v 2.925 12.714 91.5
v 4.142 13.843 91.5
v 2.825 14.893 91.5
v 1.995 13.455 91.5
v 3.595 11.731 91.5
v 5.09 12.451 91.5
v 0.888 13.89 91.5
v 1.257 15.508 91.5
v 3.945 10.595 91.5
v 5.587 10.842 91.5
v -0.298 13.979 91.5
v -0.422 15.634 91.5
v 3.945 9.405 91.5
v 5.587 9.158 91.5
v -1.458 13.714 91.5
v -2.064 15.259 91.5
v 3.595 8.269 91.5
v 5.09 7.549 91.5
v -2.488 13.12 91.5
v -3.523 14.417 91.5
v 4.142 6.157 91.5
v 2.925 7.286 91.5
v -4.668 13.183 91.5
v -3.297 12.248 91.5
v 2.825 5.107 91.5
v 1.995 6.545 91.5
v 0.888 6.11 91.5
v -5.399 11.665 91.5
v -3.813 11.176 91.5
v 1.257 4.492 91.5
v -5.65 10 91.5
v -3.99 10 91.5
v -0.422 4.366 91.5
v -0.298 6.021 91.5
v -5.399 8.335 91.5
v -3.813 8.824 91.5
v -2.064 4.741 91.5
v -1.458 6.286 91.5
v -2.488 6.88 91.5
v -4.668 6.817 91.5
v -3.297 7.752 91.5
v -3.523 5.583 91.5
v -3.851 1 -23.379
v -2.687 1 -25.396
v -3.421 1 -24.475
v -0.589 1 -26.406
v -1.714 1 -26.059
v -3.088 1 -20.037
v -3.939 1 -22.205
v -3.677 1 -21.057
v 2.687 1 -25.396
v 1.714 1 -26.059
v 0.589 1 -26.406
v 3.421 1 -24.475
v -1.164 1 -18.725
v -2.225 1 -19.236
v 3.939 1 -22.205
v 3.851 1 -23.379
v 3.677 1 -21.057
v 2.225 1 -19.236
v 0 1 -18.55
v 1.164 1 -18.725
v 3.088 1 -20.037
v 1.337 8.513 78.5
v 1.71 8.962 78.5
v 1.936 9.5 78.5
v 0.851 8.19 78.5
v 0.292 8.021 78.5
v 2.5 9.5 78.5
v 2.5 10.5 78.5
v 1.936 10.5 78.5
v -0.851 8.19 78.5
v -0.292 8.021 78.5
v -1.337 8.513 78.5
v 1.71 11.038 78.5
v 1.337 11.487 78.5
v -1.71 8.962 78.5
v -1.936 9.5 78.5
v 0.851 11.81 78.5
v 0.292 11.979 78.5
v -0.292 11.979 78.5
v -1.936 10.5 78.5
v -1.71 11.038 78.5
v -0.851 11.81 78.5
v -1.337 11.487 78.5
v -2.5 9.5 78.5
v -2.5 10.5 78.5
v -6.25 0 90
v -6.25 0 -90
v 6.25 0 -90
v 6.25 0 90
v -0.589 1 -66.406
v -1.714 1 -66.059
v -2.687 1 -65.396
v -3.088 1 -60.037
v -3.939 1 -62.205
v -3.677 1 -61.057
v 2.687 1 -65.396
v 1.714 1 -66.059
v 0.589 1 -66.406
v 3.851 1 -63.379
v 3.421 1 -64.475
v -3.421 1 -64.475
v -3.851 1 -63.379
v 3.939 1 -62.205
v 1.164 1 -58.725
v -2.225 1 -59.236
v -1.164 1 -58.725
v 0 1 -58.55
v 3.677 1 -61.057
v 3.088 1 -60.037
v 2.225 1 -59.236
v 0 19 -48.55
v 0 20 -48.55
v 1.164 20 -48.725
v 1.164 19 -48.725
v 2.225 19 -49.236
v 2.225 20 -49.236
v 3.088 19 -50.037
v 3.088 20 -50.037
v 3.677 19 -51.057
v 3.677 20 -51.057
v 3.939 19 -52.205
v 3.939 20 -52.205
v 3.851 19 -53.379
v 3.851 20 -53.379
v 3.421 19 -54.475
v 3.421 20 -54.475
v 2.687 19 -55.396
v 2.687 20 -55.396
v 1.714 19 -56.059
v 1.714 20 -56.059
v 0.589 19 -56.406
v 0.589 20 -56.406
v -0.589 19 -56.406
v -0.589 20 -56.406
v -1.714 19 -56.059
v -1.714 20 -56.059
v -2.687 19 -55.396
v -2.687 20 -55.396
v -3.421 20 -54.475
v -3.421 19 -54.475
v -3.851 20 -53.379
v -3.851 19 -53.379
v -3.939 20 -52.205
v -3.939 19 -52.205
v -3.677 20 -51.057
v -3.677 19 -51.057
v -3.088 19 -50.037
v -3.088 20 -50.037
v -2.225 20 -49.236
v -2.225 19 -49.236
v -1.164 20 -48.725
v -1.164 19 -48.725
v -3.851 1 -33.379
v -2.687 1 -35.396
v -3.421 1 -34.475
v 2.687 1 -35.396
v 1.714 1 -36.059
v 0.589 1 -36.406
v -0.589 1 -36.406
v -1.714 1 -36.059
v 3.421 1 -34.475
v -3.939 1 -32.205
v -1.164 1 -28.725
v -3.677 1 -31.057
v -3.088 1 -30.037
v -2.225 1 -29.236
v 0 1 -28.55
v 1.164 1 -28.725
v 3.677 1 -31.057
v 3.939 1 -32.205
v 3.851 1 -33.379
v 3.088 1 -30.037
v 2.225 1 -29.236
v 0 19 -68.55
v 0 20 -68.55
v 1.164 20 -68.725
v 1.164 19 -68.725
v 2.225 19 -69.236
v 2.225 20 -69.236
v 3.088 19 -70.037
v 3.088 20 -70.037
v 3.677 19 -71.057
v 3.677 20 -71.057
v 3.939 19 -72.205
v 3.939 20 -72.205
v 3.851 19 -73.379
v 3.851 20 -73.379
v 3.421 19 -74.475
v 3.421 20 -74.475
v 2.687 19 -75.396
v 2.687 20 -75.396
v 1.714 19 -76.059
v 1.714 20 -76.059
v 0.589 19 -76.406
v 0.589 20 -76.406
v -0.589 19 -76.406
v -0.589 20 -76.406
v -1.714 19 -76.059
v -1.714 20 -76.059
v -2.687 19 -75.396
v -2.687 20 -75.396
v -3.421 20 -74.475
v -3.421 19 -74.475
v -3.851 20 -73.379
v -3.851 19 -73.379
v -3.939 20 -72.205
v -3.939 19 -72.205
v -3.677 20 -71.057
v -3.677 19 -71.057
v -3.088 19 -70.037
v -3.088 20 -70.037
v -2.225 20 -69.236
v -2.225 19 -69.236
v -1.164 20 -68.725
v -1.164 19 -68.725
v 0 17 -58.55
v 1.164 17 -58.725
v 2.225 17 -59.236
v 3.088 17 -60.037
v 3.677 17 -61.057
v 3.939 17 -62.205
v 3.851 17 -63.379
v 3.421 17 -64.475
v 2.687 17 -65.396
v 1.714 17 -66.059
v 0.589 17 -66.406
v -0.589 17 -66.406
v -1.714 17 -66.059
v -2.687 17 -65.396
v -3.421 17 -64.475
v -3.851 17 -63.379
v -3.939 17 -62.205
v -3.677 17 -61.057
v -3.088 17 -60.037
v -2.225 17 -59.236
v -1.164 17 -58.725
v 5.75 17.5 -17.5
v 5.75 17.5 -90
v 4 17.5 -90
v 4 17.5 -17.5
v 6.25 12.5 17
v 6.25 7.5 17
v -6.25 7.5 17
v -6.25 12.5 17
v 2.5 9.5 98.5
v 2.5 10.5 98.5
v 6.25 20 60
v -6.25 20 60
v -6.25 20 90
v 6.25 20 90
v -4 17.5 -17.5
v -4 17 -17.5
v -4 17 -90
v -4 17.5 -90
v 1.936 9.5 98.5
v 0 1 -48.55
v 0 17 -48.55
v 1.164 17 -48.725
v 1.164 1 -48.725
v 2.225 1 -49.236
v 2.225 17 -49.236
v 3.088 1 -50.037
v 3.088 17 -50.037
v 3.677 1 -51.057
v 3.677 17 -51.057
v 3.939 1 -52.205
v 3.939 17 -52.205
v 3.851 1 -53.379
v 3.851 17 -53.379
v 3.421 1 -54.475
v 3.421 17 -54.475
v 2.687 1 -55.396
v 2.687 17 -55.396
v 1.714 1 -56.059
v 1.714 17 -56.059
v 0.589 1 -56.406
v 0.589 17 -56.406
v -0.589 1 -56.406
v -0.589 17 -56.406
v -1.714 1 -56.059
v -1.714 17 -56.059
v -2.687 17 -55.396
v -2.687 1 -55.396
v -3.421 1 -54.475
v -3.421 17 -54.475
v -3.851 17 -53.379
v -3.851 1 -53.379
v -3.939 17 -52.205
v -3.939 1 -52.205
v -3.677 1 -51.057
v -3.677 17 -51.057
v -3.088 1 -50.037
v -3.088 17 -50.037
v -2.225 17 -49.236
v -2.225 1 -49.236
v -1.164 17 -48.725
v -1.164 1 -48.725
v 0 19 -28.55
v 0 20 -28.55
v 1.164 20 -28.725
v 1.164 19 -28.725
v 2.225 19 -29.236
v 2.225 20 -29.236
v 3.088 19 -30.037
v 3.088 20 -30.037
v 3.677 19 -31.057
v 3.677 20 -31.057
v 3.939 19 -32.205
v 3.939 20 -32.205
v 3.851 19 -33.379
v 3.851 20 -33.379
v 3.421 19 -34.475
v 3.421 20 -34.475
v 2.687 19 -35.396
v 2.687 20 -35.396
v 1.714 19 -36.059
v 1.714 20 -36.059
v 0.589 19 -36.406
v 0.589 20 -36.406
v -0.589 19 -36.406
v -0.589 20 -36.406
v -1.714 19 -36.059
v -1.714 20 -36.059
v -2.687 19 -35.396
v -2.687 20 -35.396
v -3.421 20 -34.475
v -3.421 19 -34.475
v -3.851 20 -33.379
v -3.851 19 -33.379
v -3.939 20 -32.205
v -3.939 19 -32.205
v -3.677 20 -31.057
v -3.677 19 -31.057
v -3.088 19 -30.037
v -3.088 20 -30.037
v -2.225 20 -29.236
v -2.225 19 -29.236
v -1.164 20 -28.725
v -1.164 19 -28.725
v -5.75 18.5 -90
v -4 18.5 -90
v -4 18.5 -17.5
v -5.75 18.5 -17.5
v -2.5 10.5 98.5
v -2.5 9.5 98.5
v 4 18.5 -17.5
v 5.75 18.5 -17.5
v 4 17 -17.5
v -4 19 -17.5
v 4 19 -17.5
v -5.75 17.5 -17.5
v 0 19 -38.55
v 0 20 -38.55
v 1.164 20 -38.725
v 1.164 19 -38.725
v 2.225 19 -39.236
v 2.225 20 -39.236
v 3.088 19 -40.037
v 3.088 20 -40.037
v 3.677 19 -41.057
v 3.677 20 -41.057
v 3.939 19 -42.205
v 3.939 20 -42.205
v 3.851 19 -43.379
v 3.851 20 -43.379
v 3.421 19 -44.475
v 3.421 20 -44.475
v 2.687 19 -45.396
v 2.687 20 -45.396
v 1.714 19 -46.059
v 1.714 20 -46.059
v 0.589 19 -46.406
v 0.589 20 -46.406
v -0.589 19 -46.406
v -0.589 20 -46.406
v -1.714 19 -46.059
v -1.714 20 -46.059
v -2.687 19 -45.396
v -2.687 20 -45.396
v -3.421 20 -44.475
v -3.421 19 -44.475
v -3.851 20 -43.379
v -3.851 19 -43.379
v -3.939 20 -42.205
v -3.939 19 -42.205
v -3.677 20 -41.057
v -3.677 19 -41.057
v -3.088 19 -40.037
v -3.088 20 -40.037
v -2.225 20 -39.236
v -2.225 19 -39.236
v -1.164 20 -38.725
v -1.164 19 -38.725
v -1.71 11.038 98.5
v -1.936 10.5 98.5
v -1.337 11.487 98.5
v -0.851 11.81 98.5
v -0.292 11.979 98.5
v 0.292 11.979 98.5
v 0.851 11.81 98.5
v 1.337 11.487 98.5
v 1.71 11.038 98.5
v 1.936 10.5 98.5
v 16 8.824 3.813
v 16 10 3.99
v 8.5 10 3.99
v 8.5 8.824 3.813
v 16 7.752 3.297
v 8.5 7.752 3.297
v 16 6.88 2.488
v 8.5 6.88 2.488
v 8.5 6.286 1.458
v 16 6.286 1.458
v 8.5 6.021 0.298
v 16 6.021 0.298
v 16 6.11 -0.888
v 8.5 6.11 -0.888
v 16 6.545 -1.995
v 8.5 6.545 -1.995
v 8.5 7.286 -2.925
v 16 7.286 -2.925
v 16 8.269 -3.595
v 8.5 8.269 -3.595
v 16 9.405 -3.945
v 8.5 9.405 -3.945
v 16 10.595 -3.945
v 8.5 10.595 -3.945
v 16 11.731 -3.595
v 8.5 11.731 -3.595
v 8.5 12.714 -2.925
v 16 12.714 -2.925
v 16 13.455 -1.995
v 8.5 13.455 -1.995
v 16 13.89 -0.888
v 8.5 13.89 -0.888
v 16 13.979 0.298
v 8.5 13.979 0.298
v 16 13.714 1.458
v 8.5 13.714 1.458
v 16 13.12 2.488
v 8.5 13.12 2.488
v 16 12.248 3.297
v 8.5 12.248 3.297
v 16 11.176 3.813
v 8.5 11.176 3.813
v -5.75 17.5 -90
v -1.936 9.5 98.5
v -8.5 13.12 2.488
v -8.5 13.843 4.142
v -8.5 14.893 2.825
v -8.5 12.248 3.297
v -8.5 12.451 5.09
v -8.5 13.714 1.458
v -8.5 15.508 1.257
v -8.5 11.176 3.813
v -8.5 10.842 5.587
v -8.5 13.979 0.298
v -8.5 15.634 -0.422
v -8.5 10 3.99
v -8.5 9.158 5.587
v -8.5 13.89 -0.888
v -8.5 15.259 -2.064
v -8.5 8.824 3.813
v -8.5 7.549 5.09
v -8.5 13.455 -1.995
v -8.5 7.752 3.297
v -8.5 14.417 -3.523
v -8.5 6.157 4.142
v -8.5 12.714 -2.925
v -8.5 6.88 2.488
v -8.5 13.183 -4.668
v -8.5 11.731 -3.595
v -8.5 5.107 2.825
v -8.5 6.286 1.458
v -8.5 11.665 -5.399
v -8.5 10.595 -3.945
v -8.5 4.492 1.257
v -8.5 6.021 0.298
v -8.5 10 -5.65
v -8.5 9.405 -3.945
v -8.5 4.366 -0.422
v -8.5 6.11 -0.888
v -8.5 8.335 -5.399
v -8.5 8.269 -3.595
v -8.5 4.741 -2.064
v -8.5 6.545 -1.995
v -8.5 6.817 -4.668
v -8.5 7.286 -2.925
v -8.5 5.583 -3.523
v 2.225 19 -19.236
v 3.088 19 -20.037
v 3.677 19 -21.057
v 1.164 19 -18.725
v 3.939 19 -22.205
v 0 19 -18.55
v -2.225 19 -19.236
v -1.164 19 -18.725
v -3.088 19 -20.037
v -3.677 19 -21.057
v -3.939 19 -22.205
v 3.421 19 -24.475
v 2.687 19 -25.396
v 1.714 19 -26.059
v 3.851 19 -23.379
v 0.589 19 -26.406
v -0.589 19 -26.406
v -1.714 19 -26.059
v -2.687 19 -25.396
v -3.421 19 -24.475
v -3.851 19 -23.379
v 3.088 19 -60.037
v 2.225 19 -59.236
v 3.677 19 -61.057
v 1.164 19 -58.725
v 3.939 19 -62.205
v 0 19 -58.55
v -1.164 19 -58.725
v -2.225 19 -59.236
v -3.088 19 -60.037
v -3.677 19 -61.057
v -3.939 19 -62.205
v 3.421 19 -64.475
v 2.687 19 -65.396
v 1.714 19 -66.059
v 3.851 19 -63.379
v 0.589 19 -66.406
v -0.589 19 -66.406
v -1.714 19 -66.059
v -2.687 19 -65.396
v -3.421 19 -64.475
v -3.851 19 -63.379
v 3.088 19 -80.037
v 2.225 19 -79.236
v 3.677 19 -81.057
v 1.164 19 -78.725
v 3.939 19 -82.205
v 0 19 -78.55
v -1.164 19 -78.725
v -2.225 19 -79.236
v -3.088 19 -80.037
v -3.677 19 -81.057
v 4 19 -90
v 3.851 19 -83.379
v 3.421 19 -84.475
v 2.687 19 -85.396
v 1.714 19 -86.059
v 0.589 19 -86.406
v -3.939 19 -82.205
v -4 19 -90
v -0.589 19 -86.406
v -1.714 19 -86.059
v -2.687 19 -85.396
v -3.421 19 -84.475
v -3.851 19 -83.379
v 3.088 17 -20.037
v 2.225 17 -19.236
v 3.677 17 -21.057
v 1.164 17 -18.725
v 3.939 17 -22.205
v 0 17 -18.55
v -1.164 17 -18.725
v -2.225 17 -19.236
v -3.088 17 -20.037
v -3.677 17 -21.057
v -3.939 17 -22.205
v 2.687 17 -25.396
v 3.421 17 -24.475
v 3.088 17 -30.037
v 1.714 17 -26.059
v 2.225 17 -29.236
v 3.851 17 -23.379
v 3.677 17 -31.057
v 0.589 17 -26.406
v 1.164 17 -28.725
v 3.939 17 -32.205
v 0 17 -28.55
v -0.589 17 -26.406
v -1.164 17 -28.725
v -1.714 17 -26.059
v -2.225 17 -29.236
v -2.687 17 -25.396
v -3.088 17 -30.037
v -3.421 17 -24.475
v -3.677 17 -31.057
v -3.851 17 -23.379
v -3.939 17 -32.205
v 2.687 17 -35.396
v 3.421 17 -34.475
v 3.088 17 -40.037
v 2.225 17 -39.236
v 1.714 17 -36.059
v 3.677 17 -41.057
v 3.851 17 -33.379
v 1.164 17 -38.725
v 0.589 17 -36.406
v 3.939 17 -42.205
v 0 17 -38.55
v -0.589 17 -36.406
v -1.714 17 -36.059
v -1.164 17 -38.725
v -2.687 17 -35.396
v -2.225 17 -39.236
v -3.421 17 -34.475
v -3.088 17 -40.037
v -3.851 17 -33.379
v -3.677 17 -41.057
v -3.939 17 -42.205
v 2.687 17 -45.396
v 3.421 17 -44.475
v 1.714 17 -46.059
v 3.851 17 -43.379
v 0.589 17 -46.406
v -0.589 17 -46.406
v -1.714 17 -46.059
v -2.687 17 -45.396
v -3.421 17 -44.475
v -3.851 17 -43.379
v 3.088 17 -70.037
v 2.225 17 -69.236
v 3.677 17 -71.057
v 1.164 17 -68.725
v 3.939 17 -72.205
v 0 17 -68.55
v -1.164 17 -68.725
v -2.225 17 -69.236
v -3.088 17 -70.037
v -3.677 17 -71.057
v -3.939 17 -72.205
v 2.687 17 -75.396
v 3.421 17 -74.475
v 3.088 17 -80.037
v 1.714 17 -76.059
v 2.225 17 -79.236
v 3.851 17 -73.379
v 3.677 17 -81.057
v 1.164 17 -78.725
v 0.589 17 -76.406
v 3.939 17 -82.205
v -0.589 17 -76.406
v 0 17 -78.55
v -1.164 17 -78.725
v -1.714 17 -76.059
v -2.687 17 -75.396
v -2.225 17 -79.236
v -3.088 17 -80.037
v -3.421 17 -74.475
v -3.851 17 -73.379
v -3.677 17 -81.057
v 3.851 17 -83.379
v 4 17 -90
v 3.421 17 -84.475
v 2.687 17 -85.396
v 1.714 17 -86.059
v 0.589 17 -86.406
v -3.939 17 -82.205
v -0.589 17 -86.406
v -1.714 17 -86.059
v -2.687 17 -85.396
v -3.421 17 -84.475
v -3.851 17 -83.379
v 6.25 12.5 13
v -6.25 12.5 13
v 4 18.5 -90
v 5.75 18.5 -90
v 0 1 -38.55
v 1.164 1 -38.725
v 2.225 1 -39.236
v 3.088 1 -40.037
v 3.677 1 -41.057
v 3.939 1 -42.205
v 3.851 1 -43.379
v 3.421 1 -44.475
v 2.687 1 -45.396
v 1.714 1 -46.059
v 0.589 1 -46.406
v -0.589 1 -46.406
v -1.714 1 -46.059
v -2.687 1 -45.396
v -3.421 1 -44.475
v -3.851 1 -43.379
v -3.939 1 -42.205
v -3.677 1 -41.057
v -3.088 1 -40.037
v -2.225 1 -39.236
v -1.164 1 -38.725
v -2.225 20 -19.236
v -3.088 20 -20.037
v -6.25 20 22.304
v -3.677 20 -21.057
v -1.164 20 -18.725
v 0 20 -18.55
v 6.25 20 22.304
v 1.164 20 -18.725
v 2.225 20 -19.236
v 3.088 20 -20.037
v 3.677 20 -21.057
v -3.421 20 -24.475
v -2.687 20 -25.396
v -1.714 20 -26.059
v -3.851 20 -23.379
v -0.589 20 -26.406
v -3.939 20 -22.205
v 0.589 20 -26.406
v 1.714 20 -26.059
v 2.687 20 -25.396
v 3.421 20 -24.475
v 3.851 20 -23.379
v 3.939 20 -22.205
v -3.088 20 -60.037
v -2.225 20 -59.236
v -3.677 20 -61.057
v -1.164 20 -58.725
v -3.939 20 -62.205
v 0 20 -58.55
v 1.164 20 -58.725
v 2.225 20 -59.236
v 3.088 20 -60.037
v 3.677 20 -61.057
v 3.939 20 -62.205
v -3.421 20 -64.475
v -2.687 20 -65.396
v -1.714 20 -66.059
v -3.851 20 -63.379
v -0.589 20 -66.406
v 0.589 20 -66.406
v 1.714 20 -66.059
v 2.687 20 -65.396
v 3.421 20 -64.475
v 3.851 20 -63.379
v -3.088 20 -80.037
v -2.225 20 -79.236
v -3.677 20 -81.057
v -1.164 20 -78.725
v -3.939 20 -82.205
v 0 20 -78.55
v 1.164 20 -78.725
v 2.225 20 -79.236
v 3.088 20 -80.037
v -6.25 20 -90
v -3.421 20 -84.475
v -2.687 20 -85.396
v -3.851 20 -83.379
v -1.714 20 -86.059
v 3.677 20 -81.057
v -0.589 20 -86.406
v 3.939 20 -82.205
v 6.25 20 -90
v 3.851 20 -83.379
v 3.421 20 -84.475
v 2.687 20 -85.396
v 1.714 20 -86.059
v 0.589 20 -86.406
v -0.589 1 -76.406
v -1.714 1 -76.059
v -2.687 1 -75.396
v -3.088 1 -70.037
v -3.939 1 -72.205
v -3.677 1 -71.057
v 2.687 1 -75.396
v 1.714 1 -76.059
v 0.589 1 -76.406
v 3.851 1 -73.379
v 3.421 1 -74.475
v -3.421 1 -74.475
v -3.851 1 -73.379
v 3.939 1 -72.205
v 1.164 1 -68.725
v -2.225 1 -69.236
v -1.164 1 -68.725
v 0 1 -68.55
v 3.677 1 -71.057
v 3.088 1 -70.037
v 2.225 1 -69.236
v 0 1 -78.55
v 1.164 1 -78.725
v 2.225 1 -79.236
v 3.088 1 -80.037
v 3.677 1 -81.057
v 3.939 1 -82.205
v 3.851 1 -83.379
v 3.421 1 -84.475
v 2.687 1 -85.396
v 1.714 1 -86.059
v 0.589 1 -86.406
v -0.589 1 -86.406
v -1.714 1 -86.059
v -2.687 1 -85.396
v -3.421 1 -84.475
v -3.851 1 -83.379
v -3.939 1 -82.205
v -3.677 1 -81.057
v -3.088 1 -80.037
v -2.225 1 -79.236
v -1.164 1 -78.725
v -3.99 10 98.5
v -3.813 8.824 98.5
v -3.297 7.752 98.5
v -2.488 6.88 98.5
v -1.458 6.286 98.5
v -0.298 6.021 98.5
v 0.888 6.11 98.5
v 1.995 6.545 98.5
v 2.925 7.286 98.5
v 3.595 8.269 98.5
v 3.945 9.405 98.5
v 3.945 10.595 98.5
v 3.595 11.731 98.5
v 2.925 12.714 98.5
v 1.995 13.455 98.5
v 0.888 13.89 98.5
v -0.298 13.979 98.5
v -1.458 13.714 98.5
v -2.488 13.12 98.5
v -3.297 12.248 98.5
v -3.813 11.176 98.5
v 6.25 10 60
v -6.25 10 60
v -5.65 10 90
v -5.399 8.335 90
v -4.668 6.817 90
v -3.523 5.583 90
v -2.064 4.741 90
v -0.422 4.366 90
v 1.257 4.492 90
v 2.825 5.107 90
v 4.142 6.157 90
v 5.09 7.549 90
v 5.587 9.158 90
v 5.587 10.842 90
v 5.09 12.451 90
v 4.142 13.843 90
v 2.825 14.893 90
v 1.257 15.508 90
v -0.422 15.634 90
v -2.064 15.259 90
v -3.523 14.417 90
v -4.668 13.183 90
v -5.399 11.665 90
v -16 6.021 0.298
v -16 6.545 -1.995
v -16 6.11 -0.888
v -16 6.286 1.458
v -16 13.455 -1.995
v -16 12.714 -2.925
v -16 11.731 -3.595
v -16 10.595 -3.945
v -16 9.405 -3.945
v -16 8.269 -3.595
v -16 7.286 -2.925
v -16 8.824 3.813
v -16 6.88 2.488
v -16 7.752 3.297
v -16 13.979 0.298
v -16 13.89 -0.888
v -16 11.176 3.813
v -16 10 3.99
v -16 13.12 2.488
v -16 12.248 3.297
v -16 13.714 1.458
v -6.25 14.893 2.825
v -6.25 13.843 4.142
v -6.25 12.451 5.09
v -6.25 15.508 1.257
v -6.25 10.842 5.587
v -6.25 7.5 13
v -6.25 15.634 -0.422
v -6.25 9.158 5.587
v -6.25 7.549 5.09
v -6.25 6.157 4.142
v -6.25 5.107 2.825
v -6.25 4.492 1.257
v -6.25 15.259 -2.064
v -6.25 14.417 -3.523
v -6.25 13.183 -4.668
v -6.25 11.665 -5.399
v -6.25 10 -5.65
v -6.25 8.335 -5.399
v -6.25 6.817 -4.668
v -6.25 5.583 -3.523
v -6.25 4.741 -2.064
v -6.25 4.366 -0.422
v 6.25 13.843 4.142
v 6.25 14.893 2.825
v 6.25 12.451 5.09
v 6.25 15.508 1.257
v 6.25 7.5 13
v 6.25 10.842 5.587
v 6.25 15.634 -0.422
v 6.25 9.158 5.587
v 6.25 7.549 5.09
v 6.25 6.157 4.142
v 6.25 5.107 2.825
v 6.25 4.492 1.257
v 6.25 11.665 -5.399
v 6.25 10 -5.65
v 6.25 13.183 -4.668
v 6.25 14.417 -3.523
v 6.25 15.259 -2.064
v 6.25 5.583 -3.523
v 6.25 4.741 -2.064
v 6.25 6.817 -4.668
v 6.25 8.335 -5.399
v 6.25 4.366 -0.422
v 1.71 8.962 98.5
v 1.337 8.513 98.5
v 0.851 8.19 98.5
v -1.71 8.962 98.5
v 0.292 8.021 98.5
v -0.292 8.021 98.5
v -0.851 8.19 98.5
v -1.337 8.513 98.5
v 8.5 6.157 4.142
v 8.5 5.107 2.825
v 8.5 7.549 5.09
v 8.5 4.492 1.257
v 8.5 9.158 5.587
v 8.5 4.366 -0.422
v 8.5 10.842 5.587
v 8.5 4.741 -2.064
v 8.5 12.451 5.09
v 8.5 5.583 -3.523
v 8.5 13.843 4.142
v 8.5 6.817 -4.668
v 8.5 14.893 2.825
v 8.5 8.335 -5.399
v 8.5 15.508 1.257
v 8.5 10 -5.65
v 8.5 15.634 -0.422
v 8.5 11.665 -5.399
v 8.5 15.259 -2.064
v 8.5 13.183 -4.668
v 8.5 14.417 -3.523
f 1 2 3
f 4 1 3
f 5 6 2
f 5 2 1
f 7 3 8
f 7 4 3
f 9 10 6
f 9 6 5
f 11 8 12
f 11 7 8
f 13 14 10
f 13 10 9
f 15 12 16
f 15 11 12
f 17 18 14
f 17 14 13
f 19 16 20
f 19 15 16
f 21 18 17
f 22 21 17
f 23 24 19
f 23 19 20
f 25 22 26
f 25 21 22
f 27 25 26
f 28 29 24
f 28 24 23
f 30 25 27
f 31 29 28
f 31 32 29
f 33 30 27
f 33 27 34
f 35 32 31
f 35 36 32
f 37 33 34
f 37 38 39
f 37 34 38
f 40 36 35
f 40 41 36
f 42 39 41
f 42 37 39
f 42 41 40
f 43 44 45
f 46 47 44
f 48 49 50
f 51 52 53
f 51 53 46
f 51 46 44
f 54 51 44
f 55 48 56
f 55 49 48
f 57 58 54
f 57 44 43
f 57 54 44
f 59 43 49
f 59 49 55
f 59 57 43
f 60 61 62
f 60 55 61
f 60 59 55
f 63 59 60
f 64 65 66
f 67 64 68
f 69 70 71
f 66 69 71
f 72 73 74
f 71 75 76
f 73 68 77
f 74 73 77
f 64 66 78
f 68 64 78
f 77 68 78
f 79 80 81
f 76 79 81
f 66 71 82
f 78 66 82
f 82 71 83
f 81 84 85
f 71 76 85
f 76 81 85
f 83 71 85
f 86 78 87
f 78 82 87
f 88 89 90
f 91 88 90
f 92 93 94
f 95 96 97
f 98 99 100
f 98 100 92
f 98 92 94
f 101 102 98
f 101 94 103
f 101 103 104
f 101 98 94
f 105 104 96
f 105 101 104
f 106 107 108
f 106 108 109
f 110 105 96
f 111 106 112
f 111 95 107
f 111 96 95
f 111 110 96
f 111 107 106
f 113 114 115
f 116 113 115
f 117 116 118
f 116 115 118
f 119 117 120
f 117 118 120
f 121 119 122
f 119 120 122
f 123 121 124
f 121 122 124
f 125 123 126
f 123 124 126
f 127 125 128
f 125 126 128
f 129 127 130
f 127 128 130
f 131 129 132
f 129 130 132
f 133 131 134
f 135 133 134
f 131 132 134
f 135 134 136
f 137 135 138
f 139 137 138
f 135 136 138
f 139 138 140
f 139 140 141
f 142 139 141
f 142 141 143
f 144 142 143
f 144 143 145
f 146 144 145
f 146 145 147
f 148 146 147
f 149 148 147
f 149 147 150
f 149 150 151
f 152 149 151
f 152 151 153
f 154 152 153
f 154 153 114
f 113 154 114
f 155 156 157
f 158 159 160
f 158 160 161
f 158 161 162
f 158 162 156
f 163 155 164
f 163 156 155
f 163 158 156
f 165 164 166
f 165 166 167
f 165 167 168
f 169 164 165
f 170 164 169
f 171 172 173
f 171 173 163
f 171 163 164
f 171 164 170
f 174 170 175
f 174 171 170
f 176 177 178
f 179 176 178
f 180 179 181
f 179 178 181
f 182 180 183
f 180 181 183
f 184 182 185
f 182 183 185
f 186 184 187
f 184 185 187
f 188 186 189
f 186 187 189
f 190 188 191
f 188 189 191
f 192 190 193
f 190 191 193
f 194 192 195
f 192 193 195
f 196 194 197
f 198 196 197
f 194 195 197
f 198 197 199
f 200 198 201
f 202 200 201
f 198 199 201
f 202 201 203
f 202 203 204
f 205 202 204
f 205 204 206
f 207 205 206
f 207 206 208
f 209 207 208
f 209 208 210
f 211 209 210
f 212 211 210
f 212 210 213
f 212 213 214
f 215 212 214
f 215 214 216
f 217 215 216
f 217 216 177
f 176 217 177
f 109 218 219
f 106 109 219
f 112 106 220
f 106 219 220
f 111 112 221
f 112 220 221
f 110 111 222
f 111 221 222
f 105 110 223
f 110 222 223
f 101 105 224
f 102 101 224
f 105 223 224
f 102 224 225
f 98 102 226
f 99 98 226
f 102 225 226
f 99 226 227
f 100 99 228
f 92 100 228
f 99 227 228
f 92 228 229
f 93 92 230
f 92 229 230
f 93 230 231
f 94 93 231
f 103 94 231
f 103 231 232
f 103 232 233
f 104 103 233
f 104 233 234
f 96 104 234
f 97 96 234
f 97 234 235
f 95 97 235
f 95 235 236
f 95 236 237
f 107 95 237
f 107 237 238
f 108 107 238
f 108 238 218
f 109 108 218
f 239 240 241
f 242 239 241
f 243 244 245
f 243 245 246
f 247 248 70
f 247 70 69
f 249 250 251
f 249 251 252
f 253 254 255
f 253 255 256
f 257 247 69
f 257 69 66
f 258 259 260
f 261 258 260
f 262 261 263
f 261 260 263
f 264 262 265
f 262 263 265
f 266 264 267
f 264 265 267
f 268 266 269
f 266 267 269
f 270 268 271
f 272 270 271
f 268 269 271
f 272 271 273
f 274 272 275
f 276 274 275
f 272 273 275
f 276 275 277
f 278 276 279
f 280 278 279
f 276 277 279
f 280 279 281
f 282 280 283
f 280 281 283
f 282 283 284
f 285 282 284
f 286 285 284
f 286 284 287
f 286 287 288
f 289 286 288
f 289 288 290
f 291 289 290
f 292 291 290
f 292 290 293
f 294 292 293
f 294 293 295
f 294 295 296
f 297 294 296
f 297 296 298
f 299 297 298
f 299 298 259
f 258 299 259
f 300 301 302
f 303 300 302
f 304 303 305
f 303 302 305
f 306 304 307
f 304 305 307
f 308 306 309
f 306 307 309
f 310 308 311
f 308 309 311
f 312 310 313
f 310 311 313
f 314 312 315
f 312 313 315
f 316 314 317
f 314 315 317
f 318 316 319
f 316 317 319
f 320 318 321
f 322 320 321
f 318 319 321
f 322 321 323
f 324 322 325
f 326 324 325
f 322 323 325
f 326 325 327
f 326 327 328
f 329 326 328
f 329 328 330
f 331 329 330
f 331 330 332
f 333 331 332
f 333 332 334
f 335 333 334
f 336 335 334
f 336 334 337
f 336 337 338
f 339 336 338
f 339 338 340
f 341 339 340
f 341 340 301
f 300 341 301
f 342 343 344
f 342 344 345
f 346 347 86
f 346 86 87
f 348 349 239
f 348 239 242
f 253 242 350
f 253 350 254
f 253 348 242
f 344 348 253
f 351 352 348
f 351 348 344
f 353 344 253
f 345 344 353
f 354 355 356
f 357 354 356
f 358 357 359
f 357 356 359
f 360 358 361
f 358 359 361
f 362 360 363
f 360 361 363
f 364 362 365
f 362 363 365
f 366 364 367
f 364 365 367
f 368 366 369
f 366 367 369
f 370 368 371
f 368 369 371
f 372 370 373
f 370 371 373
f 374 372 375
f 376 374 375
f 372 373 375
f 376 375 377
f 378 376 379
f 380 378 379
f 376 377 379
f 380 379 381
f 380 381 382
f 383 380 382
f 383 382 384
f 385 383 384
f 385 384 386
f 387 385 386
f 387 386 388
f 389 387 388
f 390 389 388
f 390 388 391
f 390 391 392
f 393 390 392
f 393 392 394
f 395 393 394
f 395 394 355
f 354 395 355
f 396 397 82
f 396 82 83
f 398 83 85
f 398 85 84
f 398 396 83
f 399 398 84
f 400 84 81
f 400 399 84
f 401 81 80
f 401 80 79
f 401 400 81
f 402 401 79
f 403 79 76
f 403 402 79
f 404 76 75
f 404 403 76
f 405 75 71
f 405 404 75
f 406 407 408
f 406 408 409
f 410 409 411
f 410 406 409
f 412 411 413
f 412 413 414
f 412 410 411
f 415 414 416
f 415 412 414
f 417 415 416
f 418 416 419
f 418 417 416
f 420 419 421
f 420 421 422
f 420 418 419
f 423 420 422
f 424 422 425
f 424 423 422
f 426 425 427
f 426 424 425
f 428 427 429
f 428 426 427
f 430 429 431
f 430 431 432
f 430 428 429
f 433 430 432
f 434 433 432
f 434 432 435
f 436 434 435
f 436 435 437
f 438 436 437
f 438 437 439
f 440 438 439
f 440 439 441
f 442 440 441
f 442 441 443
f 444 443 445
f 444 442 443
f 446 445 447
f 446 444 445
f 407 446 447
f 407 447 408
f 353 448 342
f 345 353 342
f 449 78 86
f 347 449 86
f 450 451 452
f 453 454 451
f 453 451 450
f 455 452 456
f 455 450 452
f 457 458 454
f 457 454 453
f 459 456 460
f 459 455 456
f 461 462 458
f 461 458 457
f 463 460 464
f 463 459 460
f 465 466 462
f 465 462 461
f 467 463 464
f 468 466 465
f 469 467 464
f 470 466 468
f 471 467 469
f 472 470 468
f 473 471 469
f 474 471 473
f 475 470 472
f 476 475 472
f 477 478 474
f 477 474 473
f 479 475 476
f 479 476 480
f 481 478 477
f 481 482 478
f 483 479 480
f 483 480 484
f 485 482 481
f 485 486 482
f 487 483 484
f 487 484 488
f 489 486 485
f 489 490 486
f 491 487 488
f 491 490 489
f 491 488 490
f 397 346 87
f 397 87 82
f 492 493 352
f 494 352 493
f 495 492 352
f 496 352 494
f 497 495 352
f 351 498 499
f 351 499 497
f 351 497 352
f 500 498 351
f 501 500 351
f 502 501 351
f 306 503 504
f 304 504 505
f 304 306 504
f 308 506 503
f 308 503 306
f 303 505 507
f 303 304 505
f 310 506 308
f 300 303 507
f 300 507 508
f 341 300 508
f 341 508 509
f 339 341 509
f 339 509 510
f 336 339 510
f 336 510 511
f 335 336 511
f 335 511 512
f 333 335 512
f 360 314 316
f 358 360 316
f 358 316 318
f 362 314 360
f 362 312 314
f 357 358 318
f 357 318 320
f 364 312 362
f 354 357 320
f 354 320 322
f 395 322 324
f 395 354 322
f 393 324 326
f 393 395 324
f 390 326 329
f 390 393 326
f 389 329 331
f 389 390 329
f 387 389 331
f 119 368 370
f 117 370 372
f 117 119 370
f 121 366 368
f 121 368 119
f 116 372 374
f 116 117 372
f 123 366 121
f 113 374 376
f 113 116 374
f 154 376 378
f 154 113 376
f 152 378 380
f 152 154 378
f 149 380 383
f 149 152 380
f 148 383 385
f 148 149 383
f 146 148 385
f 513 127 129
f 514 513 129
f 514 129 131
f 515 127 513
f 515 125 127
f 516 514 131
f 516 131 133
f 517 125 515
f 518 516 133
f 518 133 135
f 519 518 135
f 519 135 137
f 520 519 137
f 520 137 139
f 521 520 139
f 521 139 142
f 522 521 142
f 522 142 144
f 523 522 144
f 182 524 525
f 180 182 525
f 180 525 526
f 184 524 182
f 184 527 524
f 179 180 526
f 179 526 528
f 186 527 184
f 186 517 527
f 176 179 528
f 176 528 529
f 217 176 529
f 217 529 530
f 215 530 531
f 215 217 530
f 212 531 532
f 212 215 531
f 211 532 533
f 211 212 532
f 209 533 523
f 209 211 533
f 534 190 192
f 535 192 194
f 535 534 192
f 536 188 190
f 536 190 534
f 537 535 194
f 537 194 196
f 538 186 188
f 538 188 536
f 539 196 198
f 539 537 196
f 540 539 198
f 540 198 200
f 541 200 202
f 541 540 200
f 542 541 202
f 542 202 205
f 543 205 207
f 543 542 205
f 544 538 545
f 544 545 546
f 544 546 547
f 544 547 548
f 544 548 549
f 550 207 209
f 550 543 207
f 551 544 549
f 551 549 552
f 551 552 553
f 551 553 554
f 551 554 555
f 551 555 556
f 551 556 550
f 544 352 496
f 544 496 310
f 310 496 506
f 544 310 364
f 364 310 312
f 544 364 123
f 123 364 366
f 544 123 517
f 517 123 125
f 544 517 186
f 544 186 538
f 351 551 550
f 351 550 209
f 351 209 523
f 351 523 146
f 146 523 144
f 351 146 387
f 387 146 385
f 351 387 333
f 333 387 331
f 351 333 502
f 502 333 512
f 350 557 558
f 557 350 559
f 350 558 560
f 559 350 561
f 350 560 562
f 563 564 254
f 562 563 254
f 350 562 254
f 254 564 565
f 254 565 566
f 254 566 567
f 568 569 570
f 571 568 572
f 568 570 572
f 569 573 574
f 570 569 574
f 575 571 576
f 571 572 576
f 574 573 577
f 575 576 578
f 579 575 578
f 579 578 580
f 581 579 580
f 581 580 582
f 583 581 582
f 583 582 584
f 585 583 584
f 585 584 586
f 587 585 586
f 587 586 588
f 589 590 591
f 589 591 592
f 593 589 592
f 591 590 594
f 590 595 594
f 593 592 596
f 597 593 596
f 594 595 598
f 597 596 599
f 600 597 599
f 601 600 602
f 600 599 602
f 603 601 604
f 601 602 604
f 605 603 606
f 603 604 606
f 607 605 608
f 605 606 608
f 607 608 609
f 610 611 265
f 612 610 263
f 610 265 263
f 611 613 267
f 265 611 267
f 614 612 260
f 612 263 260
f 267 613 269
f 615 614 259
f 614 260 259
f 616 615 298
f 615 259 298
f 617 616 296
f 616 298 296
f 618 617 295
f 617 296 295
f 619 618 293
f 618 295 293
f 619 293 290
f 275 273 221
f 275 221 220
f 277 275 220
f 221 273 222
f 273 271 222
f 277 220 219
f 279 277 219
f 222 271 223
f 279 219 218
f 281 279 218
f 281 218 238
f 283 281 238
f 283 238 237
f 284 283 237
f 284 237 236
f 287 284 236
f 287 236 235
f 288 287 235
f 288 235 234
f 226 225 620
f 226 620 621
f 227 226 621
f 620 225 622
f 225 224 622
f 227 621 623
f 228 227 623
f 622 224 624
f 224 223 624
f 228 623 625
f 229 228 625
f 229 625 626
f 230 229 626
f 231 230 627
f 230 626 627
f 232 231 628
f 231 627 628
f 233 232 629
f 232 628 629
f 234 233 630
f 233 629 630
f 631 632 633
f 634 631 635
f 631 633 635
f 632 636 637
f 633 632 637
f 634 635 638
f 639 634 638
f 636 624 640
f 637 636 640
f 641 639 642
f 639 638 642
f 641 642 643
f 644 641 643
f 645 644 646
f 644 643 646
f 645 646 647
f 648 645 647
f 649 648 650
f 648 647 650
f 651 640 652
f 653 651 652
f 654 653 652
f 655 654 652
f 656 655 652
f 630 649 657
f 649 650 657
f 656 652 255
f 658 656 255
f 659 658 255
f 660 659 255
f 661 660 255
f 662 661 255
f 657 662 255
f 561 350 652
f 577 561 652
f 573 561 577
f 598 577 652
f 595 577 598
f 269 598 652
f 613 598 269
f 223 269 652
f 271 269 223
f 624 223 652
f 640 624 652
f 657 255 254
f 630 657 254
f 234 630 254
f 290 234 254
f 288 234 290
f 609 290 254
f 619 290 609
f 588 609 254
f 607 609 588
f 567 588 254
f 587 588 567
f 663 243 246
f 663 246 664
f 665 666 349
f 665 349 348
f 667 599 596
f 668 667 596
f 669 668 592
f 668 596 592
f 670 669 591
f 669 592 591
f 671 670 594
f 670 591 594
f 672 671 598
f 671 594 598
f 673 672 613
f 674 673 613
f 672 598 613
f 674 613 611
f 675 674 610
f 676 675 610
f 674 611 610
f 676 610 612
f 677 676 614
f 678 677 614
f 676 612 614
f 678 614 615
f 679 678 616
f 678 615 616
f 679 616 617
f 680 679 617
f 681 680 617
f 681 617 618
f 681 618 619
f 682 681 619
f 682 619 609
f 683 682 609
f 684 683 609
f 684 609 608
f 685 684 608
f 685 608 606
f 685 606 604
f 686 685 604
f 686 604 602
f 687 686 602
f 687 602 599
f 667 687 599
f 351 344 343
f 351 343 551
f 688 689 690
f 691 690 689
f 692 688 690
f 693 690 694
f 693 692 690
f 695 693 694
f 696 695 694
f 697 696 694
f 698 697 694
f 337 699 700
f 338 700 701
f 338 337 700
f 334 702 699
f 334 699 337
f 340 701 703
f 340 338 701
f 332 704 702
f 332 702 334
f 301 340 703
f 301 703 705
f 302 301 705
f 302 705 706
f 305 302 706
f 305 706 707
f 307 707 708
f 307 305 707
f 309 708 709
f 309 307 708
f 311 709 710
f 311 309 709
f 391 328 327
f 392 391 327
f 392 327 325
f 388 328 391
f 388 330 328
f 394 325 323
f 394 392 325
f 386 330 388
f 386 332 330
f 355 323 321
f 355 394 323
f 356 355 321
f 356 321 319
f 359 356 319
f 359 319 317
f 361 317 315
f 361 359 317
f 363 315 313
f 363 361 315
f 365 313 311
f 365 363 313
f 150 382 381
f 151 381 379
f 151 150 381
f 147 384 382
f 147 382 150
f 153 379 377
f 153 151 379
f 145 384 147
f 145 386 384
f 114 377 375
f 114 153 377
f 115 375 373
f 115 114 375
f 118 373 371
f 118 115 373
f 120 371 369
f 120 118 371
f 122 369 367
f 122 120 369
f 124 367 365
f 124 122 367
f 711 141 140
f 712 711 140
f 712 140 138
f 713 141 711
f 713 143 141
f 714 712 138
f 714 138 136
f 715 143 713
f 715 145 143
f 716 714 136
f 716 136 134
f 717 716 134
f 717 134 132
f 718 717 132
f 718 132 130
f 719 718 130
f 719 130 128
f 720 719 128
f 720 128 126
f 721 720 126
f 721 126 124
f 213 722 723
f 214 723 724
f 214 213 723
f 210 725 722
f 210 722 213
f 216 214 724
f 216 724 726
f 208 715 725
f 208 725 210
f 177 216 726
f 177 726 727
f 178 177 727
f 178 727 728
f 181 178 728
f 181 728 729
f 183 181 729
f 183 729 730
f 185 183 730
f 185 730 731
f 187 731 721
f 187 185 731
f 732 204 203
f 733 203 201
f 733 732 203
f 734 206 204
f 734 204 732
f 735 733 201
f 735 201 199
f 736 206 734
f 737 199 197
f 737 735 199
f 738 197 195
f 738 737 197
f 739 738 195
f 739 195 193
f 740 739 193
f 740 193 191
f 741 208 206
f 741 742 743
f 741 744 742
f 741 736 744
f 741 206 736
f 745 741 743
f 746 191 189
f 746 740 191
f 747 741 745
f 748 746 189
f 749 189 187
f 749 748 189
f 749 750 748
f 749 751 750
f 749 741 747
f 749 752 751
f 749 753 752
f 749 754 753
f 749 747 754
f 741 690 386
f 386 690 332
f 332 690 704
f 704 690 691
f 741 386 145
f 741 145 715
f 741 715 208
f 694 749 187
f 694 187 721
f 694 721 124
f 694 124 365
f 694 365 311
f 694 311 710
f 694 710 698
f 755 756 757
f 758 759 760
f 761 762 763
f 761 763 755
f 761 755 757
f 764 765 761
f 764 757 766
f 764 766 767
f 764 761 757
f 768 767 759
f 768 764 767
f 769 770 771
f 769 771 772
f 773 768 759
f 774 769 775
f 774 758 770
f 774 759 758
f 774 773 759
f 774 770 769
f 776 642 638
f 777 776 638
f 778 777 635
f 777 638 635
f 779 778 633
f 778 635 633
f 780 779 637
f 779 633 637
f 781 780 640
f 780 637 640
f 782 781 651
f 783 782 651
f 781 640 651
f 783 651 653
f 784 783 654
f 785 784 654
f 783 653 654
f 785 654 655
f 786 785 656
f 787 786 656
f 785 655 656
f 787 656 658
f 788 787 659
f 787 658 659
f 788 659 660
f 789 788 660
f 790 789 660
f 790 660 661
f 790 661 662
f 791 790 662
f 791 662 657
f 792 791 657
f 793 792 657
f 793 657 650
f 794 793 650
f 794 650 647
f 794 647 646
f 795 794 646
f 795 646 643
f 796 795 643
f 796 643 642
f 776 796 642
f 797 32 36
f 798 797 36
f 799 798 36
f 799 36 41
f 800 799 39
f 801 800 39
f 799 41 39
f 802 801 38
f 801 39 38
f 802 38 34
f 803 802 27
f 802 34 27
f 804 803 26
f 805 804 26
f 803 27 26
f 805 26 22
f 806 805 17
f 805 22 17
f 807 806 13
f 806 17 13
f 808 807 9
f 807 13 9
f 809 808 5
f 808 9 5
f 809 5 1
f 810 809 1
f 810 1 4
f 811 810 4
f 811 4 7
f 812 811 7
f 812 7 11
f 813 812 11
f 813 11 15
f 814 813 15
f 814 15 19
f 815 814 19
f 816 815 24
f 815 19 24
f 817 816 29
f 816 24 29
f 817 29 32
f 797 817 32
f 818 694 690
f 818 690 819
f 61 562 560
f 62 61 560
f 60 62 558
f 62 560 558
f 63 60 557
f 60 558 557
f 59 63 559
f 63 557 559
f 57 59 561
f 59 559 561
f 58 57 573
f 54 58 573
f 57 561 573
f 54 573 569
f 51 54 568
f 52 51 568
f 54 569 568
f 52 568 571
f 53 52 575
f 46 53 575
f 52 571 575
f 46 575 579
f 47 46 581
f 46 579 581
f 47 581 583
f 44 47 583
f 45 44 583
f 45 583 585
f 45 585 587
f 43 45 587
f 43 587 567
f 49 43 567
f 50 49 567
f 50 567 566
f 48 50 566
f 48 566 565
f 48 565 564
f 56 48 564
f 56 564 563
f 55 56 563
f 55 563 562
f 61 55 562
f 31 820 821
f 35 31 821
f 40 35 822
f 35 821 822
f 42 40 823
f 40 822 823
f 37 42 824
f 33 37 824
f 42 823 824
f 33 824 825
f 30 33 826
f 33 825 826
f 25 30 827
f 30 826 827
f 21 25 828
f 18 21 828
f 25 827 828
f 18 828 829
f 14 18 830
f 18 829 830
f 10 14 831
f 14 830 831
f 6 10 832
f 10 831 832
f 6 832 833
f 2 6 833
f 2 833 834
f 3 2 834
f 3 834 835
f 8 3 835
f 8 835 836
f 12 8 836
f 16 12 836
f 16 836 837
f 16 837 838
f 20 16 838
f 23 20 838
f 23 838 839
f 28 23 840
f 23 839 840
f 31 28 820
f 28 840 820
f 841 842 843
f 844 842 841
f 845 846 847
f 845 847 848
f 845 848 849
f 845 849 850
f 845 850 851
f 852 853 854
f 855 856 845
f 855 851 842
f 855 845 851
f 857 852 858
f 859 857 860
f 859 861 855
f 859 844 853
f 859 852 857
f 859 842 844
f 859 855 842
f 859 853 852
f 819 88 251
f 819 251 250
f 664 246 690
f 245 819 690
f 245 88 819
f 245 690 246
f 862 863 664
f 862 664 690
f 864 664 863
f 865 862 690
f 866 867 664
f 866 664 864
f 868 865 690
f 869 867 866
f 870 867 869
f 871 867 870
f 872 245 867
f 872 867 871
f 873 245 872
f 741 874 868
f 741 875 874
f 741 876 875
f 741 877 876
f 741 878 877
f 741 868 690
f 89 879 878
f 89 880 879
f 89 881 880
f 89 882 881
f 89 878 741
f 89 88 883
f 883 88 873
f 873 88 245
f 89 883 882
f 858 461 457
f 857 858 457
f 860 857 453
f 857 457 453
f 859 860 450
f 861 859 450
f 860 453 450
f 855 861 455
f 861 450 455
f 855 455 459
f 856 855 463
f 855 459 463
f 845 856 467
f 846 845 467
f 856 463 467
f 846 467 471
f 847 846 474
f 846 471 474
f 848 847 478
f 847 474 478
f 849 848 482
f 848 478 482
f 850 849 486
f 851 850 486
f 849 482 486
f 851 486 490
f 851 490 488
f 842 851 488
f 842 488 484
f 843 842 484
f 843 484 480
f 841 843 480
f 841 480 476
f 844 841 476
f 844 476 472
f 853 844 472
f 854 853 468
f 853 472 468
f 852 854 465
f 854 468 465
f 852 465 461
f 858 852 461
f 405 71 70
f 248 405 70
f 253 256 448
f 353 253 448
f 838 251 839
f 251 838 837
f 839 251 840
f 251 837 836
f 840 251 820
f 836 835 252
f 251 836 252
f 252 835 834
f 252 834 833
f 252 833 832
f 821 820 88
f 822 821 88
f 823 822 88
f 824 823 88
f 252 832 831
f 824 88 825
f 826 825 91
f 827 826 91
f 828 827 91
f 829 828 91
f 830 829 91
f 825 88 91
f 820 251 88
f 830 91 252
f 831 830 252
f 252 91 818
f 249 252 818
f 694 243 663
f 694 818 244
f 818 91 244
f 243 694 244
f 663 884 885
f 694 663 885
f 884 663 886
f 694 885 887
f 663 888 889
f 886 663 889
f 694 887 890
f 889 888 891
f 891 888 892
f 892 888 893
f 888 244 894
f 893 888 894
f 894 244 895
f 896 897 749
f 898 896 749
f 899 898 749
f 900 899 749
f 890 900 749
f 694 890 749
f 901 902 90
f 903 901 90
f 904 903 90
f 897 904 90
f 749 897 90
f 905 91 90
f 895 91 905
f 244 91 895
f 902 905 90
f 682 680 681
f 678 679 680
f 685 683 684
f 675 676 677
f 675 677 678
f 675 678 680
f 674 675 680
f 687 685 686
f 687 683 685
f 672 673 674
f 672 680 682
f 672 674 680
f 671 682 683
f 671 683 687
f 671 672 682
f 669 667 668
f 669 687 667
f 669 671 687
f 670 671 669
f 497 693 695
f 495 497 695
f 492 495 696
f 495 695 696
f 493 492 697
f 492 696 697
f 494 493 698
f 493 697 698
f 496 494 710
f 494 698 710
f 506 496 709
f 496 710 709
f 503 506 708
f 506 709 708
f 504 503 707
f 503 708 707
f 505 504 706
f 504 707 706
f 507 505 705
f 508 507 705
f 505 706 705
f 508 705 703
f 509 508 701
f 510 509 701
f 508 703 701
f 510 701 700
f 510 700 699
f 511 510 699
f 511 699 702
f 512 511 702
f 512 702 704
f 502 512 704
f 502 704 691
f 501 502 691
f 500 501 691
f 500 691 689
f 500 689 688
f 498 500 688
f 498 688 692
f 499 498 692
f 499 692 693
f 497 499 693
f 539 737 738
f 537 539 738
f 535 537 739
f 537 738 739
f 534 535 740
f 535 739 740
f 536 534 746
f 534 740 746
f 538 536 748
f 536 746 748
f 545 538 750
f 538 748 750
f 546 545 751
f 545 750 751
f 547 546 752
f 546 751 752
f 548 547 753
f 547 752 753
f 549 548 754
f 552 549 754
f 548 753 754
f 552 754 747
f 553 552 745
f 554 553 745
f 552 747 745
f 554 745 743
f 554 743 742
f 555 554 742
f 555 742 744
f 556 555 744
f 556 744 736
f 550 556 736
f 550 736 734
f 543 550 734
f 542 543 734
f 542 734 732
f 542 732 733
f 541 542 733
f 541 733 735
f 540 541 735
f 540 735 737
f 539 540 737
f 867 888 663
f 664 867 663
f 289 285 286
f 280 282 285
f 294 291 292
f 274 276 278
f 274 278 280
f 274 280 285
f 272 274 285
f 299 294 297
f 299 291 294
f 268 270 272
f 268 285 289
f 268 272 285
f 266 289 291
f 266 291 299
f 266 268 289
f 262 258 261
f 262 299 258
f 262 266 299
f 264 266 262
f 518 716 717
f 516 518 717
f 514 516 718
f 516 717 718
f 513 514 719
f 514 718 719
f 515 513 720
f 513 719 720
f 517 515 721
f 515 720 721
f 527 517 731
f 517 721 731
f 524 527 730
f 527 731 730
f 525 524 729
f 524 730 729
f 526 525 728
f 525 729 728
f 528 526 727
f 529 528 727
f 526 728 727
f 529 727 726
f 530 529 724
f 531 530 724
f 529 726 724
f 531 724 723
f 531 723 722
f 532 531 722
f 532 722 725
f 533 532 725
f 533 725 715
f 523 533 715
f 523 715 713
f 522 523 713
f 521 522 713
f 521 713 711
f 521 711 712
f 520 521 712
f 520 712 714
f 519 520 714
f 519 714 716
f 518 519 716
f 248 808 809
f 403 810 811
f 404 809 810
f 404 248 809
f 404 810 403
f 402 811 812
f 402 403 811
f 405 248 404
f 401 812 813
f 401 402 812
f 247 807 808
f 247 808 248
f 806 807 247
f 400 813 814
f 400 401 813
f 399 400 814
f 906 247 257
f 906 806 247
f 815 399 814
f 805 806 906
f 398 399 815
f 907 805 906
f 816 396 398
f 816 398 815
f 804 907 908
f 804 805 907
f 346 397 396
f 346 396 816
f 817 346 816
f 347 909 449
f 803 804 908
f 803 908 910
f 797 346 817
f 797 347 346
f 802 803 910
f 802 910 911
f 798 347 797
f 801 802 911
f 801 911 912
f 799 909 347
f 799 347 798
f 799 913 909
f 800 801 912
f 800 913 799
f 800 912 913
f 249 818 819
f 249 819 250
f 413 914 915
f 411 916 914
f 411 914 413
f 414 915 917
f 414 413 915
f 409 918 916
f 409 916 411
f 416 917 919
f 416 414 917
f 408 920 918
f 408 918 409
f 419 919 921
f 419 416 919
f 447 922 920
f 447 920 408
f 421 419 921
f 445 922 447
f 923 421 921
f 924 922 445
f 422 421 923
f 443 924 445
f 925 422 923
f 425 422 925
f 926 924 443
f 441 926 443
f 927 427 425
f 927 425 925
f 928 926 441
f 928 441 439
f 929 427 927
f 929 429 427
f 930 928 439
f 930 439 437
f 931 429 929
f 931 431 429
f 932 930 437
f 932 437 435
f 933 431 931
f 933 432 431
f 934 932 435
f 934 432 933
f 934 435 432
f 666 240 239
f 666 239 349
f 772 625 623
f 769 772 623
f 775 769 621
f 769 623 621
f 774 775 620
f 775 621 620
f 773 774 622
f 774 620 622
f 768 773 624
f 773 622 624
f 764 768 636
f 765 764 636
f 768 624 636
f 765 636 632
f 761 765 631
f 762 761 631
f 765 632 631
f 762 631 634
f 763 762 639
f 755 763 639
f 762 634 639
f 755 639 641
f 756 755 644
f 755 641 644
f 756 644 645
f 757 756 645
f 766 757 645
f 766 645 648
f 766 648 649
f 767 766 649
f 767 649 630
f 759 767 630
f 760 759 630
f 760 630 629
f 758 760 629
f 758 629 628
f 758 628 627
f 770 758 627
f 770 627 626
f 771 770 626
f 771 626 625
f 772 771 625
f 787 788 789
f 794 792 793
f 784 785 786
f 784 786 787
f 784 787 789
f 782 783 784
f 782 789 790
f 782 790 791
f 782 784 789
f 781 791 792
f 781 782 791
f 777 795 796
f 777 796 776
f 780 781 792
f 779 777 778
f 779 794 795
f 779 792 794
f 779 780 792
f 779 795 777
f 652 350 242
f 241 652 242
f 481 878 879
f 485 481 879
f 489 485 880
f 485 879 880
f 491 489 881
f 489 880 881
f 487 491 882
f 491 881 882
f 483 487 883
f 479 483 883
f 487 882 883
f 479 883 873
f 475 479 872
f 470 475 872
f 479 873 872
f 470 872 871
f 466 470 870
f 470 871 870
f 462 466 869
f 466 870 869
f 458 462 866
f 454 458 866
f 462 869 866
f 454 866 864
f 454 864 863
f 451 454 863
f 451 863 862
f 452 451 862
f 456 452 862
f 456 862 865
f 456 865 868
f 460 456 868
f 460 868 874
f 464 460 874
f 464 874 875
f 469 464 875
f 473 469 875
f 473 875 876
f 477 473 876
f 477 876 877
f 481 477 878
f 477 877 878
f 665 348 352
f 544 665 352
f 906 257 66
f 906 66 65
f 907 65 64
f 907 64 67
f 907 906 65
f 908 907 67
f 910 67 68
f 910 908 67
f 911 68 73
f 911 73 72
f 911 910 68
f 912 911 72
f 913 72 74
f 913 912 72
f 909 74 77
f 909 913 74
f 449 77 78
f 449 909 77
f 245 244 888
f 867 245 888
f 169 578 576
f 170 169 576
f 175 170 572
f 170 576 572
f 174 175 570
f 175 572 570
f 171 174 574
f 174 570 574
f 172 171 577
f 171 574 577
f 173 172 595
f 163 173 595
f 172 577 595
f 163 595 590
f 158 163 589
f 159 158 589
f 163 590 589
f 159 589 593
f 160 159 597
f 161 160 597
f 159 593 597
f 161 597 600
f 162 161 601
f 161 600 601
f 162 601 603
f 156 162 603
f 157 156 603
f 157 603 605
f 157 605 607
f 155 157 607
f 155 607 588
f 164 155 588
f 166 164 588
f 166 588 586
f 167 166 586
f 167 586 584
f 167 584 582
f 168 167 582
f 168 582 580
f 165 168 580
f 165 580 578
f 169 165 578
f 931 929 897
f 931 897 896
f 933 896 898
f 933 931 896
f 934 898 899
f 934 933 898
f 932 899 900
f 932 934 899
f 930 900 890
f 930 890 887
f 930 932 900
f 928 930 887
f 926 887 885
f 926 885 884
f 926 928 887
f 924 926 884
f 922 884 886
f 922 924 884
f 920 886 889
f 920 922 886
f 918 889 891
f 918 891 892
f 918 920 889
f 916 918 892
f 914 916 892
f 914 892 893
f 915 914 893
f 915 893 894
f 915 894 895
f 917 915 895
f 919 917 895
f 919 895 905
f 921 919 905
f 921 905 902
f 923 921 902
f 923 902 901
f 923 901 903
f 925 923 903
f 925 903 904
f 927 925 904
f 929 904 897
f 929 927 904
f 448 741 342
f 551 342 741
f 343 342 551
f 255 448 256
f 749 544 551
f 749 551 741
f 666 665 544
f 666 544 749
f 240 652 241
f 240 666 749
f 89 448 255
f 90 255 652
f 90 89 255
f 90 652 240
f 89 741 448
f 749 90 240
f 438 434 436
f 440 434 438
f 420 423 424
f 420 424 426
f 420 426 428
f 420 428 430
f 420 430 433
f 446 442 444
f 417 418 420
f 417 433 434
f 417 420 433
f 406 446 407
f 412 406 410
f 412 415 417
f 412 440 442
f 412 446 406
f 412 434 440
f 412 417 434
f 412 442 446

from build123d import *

# Parameters (mm, degrees)
SKETCH1_W           = 12.5
SKETCH1_H           = 180
BOSS_EXTRUDE1_DEPTH = 20
SKETCH2_R           = 5.65
BOSS_EXTRUDE2_DEPTH = 1.5
SKETCH3_R           = 3.99
BOSS_EXTRUDE3_DEPTH = 7
SKETCH4_R           = 5.65
BOSS_EXTRUDE4_DEPTH = 2.25
SKETCH5_R           = 3.99
BOSS_EXTRUDE5_DEPTH = 7.5
BOSS_EXTRUDE6_START = 2.25
SKETCH6_R           = 5.65
BOSS_EXTRUDE6_DEPTH = 2.25
BOSS_EXTRUDE7_START = 7.5
SKETCH7_R           = 3.99
BOSS_EXTRUDE7_DEPTH = 7.5
SKETCH8_R           = 3.95
CUT_EXTRUDE1_DEPTH  = 19
SKETCH9_W           = 8
SKETCH9_H           = 2
CUT_EXTRUDE2_DEPTH  = 72.5
SKETCH10_W          = 11.5
SKETCH10_H          = 1
CUT_EXTRUDE3_DEPTH  = 72.5
CUT_EXTRUDE5_DEPTH  = 20
SKETCH14_W          = 4
SKETCH14_H          = 5
CUT_EXTRUDE6_DEPTH  = 12.5
CUT_EXTRUDE7_REACH  = 104.943


with BuildPart() as part:
    # Sketch1 → Boss-Extrude1 (new body)
    with BuildSketch(Plane(origin=(0, 0, 0), x_dir=(1, 0, 0), z_dir=(0, 1, 0))):
        Rectangle(SKETCH1_W, SKETCH1_H)
    extrude(amount=BOSS_EXTRUDE1_DEPTH)

    # Sketch2 → Boss-Extrude2 (add)
    with BuildSketch(Plane.XY.offset(90)):
        with Locations(Location((0, 10, 0), (0, 0, 180))):
            Circle(SKETCH2_R)
    extrude(amount=BOSS_EXTRUDE2_DEPTH)

    # Sketch3 → Boss-Extrude3 (add)
    with BuildSketch(Plane.XY.offset(91.5)):
        with Locations(Location((0, 10, 0), (0, 0, 180))):
            Circle(SKETCH3_R)
    extrude(amount=BOSS_EXTRUDE3_DEPTH)

    # Sketch4 → Boss-Extrude4 (add)
    with BuildSketch(Plane.ZY.offset(6.25)):
        with Locations(Location((0, 10, 0), (0, 0, 180))):
            Circle(SKETCH4_R)
    extrude(amount=BOSS_EXTRUDE4_DEPTH)

    # Sketch5 → Boss-Extrude5 (add)
    with BuildSketch(Plane.ZY.offset(8.5)):
        with Locations((0, 10)):
            Circle(SKETCH5_R)
    extrude(amount=BOSS_EXTRUDE5_DEPTH)

    # Sketch6 → Boss-Extrude6 (add)
    with BuildSketch(Plane(origin=(6.25, 0, 0), x_dir=(0, 0, -1), z_dir=(1, 0, 0)).offset(BOSS_EXTRUDE6_START)):
        with Locations((0, 10)):
            Circle(SKETCH6_R)
    extrude(amount=-BOSS_EXTRUDE6_DEPTH)

    # Sketch7 → Boss-Extrude7 (add)
    with BuildSketch(Plane(origin=(8.5, 0, 0), x_dir=(0, 0, -1), z_dir=(1, 0, 0)).offset(BOSS_EXTRUDE7_START)):
        with Locations(Location((0, 10, 0), (0, 0, 180))):
            Circle(SKETCH7_R)
    extrude(amount=-BOSS_EXTRUDE7_DEPTH)

    # Sketch8 → Cut-Extrude1 (cut)
    with BuildSketch(Plane(origin=(0, 20, 0), x_dir=(1, 0, 0), z_dir=(0, 1, 0))):
        with Locations(Location((0, 82.5, 0), (0, 0, 270))):
            Circle(SKETCH8_R)
        with Locations(Location((0, 72.5, 0), (0, 0, 270))):
            Circle(SKETCH8_R)
        with Locations(Location((0, 62.5, 0), (0, 0, 270))):
            Circle(SKETCH8_R)
        with Locations(Location((0, 52.5, 0), (0, 0, 270))):
            Circle(SKETCH8_R)
        with Locations(Location((0, 42.5, 0), (0, 0, 270))):
            Circle(SKETCH8_R)
        with Locations(Location((0, 32.5, 0), (0, 0, 270))):
            Circle(SKETCH8_R)
        with Locations(Location((0, 22.5, 0), (0, 0, 270))):
            Circle(SKETCH8_R)
    extrude(amount=-CUT_EXTRUDE1_DEPTH, mode=Mode.SUBTRACT)

    # Sketch9 → Cut-Extrude2 (cut)
    with BuildSketch(Plane(origin=(0, 0, -90), x_dir=(-1, 0, 0), z_dir=(0, 0, -1))):
        with Locations((0, 18)):
            Rectangle(SKETCH9_W, SKETCH9_H)
    extrude(amount=-CUT_EXTRUDE2_DEPTH, mode=Mode.SUBTRACT)

    # Sketch10 → Cut-Extrude3 (cut)
    with BuildSketch(Plane(origin=(0, 0, -90), x_dir=(-1, 0, 0), z_dir=(0, 0, -1))):
        with Locations((0, 18)):
            Rectangle(SKETCH10_W, SKETCH10_H)
    extrude(amount=-CUT_EXTRUDE3_DEPTH, mode=Mode.SUBTRACT)

    # Sketch12 → Cut-Extrude5 (cut)
    with BuildSketch(Plane.XY.offset(98.5)):
        with BuildLine():
            Line((1.936491673, 10.5), (2.5, 10.5))
            Line((2.5, 10.5), (2.5, 9.5))
            Line((2.5, 9.5), (1.936491673, 9.5))
            ThreePointArc((1.936491673, 9.5), (0, 8), (-1.936491673, 9.5))
            Line((-1.936491673, 9.5), (-2.5, 9.5))
            Line((-2.5, 9.5), (-2.5, 10.5))
            Line((-2.5, 10.5), (-1.936491673, 10.5))
            ThreePointArc((-1.936491673, 10.5), (0, 12), (1.936491673, 10.5))
        make_face()
    extrude(amount=-CUT_EXTRUDE5_DEPTH, mode=Mode.SUBTRACT)

    # Sketch14 → Cut-Extrude6 (cut)
    with BuildSketch(Plane(origin=(6.25, 0, 0), x_dir=(0, 0, -1), z_dir=(1, 0, 0))):
        with Locations((-15, 10)):
            Rectangle(SKETCH14_W, SKETCH14_H)
    extrude(amount=-CUT_EXTRUDE6_DEPTH, mode=Mode.SUBTRACT)

    # Sketch15 → Cut-Extrude7 (cut, up to next)
    with BuildSketch(Plane(origin=(6.25, 0, 0), x_dir=(0, 0, -1), z_dir=(1, 0, 0)), mode=Mode.PRIVATE) as cut_extrude7_sk1:
        Polygon((-60, 10), (-60, 20), (-22.30384635, 20), align=None)
    cut_extrude7_tool1 = extrude(cut_extrude7_sk1.sketch, amount=-CUT_EXTRUDE7_REACH, mode=Mode.PRIVATE) & part.part
    add(cut_extrude7_tool1.solids().sort_by_distance((6.25, 16.666667, 47.434615))[0], mode=Mode.SUBTRACT)


solid = part.part
